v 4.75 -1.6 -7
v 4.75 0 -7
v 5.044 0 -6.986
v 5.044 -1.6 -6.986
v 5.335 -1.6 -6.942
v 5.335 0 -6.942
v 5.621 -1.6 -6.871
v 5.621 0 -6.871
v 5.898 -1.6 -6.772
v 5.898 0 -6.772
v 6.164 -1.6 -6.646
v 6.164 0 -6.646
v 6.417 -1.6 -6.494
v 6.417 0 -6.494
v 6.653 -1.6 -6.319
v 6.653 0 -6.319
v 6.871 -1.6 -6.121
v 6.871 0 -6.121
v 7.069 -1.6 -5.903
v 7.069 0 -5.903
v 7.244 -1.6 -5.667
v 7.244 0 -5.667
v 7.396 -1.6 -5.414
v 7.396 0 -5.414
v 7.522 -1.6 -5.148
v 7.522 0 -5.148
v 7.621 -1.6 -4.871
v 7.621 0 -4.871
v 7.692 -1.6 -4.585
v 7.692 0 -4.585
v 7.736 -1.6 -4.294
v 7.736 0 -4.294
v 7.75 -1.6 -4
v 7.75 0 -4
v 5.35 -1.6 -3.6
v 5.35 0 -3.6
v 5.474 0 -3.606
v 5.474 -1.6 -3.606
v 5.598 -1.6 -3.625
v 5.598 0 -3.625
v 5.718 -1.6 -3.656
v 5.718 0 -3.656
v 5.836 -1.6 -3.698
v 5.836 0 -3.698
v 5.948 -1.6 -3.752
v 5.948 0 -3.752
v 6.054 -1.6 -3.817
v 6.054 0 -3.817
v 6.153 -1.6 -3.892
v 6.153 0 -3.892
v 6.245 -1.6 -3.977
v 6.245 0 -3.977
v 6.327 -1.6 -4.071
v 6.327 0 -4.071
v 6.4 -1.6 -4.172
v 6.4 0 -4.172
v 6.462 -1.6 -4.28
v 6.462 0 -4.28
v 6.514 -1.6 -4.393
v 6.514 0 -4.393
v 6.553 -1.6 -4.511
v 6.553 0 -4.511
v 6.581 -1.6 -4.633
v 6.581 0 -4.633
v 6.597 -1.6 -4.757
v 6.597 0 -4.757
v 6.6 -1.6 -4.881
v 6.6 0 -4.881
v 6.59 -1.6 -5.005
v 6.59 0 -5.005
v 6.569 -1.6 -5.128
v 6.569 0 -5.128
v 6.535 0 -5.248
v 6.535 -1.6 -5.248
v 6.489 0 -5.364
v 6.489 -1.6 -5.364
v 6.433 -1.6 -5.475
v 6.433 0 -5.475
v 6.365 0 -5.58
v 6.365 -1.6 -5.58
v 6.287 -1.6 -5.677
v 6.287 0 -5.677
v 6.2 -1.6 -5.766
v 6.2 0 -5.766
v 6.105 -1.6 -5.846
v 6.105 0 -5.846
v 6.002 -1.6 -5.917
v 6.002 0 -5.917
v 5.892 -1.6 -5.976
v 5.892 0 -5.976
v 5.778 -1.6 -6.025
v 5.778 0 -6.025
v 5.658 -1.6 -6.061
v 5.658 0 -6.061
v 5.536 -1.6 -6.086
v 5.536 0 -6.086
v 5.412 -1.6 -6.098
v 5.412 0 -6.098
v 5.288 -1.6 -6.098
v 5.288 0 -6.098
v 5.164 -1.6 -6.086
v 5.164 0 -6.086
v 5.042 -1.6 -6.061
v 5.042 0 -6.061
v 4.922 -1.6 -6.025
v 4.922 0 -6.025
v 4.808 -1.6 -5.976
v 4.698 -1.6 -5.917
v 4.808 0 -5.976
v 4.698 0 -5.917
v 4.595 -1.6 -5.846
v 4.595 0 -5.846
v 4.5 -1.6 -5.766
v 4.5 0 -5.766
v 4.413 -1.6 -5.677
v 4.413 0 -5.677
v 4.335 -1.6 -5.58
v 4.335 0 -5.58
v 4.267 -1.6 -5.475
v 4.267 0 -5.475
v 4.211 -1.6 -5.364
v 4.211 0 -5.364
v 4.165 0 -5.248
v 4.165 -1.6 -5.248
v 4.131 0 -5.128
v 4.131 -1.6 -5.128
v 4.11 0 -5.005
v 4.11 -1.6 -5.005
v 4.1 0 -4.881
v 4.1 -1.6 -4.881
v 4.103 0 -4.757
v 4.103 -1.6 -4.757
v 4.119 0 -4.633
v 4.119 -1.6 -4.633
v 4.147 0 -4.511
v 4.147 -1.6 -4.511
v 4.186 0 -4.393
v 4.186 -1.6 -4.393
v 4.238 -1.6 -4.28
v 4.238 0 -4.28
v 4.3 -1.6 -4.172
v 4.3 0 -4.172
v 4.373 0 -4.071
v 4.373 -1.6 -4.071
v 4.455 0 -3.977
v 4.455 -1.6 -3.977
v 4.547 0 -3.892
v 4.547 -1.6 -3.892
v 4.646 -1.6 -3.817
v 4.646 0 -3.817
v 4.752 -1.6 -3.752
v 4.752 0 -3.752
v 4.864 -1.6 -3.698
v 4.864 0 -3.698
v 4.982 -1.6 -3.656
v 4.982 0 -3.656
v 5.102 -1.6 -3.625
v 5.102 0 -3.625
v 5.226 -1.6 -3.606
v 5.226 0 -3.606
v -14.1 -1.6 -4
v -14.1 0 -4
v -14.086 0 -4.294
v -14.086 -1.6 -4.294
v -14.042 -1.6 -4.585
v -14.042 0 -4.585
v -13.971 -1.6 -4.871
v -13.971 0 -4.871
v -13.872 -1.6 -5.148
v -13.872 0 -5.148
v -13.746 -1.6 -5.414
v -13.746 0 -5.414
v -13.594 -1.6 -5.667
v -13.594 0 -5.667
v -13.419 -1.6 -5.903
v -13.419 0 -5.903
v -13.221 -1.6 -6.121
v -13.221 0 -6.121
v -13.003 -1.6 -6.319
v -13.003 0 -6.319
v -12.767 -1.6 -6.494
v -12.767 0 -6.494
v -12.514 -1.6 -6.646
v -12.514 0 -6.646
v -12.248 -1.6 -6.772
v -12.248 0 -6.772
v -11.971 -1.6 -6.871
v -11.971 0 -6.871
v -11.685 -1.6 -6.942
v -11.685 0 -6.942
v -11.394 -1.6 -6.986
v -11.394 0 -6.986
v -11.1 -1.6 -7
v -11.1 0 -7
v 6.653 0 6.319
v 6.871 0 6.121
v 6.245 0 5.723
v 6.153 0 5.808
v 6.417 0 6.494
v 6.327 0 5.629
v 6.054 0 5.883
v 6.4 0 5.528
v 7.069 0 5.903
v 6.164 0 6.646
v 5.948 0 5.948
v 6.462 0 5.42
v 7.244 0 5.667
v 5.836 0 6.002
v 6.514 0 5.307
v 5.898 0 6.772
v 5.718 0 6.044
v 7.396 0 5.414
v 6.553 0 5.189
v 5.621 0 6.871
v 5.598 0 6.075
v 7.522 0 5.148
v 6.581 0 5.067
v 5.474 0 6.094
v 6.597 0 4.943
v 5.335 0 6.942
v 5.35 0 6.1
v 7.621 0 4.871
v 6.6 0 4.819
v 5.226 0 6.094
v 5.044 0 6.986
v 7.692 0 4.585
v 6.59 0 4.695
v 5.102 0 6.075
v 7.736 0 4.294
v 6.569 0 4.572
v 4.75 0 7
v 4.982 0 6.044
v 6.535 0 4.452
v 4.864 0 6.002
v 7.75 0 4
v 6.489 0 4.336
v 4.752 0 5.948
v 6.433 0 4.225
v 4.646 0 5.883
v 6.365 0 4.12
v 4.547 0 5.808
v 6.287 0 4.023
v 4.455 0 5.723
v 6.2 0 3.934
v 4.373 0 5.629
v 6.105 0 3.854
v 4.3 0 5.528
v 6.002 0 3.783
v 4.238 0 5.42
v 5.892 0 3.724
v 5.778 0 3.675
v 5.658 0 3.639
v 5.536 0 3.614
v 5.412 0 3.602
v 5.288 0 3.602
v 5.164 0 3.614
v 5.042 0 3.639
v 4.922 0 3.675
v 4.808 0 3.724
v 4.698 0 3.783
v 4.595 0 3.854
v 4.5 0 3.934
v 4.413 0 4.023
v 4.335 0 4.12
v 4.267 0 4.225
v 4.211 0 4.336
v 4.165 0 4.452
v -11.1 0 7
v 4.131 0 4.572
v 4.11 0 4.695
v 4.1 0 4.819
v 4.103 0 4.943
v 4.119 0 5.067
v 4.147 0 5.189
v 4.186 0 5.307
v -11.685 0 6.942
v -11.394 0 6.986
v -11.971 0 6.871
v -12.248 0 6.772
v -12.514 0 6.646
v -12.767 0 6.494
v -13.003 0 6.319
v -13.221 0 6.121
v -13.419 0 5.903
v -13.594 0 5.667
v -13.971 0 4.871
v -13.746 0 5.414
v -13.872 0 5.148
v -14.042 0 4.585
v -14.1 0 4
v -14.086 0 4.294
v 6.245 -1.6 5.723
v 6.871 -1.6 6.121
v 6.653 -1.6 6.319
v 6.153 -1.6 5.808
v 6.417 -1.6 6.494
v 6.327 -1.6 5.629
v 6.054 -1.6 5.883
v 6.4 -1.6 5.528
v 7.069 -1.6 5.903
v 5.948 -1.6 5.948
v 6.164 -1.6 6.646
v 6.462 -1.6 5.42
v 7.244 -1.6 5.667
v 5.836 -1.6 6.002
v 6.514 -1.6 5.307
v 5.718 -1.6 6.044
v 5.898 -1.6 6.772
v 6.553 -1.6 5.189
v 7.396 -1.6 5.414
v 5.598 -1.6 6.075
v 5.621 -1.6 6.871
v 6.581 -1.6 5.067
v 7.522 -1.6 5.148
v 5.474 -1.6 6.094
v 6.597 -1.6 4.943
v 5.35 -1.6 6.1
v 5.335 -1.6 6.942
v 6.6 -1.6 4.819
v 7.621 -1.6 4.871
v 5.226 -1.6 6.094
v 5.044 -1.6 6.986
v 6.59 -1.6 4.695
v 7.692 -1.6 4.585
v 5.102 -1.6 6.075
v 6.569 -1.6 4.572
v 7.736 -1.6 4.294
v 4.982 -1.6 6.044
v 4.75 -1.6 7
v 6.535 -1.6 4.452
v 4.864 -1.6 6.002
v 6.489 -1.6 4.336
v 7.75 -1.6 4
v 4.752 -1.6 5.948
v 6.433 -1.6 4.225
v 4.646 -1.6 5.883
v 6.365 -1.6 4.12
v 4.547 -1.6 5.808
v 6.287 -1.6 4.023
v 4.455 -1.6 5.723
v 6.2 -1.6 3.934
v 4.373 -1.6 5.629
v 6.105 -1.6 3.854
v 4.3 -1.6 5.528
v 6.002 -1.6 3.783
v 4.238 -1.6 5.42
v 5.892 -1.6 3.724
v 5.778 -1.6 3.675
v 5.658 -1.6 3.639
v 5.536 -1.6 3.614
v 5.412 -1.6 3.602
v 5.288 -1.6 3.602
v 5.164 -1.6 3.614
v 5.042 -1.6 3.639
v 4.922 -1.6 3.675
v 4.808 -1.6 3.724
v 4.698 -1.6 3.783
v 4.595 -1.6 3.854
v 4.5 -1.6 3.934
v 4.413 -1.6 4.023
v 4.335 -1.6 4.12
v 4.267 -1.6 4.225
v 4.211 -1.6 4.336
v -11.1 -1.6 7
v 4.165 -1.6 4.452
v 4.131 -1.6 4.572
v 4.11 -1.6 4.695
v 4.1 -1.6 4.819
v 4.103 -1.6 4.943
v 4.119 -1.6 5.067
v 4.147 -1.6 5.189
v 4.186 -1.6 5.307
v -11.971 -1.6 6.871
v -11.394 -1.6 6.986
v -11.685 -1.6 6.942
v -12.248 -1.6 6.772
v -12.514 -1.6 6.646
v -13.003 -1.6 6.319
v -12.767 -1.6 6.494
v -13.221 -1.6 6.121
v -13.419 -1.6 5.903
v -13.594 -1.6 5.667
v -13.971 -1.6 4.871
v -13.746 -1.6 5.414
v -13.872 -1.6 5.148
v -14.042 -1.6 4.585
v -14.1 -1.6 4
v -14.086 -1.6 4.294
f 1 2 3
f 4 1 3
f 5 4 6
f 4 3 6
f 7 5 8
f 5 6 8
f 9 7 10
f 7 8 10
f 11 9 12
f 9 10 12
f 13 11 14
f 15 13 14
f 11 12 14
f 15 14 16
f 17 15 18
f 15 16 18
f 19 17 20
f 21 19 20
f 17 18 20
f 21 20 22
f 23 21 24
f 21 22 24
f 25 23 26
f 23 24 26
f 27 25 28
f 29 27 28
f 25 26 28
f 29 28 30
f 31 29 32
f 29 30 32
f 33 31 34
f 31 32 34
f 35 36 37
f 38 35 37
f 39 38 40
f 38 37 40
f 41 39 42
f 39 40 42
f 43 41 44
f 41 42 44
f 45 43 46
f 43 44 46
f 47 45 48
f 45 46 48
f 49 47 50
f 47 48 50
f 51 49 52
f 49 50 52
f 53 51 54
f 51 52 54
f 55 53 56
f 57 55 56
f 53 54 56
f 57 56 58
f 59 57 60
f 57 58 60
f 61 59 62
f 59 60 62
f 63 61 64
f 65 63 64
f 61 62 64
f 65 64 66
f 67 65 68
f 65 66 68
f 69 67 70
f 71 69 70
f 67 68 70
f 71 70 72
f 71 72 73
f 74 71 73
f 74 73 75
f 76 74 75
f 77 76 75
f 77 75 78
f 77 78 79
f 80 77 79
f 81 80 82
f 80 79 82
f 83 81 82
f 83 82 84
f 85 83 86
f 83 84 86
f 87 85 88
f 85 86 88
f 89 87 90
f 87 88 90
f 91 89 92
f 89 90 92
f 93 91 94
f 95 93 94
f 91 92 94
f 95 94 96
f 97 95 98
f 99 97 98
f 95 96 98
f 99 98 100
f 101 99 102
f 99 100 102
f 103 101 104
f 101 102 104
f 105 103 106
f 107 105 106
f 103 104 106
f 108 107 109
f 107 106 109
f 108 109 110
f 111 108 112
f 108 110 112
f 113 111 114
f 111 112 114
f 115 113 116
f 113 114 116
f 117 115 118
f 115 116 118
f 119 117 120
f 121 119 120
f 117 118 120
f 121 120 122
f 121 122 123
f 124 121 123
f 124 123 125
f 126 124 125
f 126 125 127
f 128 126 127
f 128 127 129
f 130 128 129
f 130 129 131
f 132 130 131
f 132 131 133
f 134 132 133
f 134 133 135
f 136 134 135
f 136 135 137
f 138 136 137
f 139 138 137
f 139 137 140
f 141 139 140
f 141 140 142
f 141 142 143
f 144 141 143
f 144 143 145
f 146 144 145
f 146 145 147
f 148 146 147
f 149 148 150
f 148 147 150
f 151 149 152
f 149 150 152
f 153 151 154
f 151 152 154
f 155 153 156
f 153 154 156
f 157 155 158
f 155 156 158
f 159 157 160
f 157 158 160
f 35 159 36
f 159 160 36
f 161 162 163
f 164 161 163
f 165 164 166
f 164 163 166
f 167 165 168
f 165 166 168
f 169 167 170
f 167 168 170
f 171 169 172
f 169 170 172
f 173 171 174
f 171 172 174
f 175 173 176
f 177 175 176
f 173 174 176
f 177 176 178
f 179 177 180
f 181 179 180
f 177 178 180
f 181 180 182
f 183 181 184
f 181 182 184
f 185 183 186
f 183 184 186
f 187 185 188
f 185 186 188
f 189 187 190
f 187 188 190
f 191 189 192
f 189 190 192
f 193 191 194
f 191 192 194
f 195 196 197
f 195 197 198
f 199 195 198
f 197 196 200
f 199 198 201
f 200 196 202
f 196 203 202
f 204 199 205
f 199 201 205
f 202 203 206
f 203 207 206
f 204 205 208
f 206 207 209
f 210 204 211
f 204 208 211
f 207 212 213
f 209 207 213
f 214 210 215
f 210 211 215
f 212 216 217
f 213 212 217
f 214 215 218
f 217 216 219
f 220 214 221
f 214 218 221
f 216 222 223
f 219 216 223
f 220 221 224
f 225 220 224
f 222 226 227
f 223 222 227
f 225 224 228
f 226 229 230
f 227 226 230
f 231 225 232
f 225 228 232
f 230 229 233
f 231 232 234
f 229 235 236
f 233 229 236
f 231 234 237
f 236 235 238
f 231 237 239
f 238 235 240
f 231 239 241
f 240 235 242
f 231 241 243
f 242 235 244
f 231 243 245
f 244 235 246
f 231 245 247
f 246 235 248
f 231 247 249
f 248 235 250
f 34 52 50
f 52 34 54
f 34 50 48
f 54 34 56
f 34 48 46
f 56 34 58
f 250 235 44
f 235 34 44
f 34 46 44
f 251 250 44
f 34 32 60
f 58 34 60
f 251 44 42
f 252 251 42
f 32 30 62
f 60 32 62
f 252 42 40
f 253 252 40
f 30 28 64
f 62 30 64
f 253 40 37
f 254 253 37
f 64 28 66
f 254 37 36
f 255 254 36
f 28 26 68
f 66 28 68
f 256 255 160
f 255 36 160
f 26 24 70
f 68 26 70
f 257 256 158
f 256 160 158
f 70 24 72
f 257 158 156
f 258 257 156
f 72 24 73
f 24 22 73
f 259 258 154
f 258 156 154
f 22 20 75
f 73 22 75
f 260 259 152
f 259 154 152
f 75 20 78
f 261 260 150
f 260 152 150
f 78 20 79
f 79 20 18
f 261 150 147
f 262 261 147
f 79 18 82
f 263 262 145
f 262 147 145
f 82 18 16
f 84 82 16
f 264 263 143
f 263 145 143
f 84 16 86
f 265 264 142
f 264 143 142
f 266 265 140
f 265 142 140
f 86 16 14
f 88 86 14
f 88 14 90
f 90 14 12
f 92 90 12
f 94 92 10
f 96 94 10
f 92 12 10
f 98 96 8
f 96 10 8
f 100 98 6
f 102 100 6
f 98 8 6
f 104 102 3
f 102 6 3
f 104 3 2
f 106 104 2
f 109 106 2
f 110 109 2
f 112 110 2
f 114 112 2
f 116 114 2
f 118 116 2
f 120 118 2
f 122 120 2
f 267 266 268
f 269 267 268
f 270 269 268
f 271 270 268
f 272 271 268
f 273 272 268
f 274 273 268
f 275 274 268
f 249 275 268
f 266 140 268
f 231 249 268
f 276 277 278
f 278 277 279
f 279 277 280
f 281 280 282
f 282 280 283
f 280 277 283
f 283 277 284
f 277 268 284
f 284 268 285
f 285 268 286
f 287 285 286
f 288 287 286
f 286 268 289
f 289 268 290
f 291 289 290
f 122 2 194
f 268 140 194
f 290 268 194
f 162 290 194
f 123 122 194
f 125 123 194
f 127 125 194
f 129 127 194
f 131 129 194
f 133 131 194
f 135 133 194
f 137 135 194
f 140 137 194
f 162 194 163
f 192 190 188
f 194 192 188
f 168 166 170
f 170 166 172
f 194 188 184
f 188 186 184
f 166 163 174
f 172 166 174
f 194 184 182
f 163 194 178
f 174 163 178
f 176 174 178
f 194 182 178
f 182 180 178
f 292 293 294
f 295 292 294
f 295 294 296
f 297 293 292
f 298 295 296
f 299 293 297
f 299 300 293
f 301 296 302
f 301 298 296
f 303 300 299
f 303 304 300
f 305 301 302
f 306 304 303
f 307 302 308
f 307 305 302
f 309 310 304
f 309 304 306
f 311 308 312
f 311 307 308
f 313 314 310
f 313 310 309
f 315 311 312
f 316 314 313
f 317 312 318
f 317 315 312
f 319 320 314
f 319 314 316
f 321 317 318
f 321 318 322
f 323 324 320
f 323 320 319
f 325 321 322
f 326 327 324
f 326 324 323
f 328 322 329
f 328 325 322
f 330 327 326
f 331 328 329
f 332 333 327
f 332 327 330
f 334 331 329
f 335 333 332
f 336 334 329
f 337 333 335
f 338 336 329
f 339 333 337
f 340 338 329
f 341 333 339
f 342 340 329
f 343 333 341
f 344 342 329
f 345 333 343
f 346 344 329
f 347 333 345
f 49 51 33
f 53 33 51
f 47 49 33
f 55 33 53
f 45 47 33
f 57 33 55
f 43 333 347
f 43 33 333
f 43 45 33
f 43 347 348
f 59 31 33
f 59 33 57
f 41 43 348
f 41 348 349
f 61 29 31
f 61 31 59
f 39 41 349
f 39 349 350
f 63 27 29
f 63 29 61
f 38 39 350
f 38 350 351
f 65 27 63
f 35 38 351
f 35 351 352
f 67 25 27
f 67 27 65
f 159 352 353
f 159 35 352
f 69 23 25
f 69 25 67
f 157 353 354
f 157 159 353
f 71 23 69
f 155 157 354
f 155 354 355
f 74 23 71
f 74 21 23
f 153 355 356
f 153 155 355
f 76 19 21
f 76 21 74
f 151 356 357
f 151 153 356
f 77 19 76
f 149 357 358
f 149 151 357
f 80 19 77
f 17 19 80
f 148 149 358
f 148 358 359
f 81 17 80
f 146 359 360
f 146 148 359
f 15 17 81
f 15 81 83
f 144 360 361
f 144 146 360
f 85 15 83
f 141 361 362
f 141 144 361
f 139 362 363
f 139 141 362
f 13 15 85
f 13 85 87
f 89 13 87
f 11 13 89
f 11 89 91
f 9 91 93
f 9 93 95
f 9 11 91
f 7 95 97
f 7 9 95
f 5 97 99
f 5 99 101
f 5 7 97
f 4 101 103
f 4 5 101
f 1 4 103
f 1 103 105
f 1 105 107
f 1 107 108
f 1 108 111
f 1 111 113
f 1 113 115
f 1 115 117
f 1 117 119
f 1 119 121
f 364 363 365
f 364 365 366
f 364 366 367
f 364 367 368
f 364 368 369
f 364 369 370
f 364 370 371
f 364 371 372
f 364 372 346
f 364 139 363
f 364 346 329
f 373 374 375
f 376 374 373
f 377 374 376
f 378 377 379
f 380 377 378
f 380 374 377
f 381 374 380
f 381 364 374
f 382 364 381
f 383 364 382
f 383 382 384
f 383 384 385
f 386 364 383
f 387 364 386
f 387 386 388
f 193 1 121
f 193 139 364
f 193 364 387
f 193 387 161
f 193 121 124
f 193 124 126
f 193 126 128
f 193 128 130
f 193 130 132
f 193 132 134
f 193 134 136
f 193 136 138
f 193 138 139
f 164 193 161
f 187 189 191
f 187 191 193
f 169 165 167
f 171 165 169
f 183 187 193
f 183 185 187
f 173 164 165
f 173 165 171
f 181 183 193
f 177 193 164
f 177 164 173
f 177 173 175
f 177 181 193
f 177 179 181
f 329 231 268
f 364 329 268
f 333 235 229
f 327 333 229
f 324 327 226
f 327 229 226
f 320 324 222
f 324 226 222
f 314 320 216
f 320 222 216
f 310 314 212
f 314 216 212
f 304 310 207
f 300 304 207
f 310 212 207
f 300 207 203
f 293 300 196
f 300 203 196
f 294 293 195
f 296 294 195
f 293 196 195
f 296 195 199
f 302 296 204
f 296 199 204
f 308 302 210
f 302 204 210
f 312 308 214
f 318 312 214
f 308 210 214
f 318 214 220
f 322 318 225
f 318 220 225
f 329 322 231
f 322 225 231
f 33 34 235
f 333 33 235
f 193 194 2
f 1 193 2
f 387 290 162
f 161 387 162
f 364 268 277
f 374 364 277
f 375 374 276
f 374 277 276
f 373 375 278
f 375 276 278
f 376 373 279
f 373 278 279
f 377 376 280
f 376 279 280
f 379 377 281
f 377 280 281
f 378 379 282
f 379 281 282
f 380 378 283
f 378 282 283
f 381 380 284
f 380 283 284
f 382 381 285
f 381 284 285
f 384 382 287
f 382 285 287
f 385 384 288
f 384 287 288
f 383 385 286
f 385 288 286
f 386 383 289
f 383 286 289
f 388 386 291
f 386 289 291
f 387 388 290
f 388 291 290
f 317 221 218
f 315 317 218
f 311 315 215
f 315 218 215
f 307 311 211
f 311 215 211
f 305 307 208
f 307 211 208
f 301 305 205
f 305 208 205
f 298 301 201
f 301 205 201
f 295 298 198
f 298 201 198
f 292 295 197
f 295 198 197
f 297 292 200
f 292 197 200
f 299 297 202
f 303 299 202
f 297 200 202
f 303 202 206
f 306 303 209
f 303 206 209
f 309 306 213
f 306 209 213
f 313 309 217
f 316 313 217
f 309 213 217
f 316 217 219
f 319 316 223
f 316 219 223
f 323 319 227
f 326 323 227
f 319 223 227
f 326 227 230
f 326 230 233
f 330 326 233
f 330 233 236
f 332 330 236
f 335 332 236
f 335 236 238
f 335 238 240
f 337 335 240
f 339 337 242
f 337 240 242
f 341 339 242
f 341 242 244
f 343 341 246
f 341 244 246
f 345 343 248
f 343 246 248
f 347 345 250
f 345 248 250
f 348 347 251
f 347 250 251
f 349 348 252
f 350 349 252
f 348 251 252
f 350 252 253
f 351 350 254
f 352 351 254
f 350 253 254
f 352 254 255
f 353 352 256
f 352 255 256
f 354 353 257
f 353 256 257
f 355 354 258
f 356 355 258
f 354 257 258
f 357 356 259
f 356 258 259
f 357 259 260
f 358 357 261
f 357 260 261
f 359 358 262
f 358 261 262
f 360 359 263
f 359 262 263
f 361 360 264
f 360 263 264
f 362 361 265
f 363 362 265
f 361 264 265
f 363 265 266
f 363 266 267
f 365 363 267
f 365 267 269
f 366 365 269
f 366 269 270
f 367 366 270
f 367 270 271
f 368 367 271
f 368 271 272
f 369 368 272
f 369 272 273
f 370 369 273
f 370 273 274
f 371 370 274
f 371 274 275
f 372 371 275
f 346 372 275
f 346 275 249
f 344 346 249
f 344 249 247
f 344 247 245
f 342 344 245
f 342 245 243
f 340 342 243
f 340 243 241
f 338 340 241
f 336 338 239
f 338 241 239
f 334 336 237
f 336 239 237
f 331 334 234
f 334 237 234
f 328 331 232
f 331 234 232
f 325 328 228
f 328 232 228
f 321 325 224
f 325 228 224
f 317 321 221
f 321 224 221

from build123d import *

# Parameters (mm, degrees)
SKETCH1_R           = 1.25
BOSS_EXTRUDE1_DEPTH = 1.6


with BuildPart() as part:
    # Sketch1 → Boss-Extrude1 (new body)
    with BuildSketch(Plane(origin=(0, 0, 0), x_dir=(1, 0, 0), z_dir=(0, 1, 0))):
        with BuildLine():
            Line((-11.1, 7), (4.75, 7))
            ThreePointArc((4.75, 7), (6.871320344, 6.121320344), (7.75, 4))
            Line((7.75, 4), (7.75, -4))
            ThreePointArc((7.75, -4), (6.871320344, -6.121320344), (4.75, -7))
            Line((4.75, -7), (-11.1, -7))
            ThreePointArc((-11.1, -7), (-13.221320344, -6.121320344), (-14.1, -4))
            Line((-14.1, -4), (-14.1, 4))
            ThreePointArc((-14.1, 4), (-13.221320344, 6.121320344), (-11.1, 7))
        make_face()
        with Locations(Location((5.35, 4.85, 0), (0, 0, 270))):
            Circle(SKETCH1_R, mode=Mode.SUBTRACT)
        with Locations(Location((5.35, -4.85, 0), (0, 0, 270))):
            Circle(SKETCH1_R, mode=Mode.SUBTRACT)
    extrude(amount=-BOSS_EXTRUDE1_DEPTH)


solid = part.part
